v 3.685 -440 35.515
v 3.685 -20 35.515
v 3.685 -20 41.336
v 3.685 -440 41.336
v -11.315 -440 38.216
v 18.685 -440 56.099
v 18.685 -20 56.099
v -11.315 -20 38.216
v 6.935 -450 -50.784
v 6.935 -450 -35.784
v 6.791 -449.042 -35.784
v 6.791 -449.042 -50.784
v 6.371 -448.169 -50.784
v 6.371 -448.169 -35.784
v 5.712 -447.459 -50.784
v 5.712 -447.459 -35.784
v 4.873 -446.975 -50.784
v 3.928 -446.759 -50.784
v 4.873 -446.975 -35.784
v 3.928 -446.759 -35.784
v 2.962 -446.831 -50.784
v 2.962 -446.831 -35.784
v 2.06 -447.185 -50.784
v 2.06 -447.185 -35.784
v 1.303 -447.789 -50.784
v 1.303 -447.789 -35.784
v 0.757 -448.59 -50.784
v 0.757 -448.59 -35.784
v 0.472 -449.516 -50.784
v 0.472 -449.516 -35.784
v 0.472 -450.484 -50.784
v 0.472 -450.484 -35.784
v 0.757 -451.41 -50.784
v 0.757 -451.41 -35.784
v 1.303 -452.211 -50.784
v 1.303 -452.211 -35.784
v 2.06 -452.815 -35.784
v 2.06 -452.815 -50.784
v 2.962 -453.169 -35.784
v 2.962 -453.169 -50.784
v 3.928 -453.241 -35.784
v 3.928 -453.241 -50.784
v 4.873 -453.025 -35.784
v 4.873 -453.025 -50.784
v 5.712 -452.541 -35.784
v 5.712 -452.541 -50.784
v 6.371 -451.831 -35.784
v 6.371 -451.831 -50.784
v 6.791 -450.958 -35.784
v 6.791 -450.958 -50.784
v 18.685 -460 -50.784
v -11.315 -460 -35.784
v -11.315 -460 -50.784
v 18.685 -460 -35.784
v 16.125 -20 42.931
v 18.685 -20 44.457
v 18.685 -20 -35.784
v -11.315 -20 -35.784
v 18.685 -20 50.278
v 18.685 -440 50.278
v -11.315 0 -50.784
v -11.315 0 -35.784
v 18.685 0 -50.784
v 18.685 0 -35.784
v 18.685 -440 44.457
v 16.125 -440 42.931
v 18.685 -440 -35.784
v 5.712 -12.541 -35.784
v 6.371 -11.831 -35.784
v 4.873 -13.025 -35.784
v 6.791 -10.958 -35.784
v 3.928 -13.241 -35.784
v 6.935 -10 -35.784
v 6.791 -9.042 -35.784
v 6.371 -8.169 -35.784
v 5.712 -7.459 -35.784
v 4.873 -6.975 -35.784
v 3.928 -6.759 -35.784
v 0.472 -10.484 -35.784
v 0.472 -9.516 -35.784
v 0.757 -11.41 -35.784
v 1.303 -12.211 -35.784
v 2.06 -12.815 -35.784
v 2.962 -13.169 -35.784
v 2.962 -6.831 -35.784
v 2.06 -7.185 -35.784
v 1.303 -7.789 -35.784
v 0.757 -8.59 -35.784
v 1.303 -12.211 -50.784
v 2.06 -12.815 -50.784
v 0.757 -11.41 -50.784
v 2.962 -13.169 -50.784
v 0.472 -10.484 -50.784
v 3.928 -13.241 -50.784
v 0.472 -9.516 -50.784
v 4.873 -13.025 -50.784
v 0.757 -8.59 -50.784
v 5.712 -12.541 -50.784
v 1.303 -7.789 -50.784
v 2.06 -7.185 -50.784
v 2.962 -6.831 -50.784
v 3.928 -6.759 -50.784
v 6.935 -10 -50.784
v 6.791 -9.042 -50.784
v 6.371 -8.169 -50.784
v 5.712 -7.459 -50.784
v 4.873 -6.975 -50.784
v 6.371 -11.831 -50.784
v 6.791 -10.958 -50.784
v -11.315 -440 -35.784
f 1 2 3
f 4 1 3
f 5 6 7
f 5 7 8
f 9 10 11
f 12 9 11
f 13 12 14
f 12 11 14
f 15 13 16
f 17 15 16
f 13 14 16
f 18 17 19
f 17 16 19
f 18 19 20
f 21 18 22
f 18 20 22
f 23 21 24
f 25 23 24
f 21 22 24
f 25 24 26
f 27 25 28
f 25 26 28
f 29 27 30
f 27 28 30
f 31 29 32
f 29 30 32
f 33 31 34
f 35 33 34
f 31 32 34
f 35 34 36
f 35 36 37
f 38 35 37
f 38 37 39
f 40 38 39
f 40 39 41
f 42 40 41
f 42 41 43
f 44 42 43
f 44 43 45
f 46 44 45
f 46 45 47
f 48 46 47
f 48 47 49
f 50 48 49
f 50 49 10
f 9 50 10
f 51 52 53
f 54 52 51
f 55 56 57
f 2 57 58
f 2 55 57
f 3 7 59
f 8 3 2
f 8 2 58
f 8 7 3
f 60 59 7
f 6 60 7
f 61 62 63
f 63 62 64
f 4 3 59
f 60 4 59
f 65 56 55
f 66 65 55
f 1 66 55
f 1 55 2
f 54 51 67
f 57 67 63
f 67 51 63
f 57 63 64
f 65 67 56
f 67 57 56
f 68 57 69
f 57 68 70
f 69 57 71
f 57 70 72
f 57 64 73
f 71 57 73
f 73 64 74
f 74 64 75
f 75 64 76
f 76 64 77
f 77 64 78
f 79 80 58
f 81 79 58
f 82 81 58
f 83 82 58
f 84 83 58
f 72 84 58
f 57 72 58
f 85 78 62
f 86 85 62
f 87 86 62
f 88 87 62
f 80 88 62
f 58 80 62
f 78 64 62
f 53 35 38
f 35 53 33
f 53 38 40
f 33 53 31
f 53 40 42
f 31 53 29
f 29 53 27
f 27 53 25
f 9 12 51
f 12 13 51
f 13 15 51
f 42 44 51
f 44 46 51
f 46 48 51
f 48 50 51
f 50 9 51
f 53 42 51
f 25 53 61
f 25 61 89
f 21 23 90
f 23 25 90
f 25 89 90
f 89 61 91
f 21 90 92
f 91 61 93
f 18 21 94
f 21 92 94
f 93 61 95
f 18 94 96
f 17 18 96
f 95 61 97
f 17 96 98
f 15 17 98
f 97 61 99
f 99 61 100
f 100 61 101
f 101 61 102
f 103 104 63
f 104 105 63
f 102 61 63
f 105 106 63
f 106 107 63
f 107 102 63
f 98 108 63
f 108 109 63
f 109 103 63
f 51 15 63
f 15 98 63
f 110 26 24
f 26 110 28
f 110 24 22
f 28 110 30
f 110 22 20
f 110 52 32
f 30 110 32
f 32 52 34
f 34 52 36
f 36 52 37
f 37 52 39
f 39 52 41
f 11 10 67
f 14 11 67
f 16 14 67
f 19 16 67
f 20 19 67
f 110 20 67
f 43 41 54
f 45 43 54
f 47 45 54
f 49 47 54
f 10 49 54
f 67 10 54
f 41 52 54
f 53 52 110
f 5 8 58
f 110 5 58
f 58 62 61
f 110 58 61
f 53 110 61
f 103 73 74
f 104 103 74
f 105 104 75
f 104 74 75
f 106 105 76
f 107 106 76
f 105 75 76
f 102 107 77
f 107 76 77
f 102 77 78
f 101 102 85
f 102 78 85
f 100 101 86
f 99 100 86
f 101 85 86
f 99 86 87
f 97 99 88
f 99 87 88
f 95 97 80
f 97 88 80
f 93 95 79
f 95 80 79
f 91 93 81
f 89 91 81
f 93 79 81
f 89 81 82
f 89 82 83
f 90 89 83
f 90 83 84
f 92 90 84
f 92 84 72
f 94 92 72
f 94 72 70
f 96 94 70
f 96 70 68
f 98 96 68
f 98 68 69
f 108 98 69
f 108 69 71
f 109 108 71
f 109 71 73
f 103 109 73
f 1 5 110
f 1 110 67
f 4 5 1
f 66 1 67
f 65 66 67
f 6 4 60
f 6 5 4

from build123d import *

# Parameters (mm, degrees)
F1_DEPTH = 460
F2_W     = 30
F2_H     = 93
F3_DEPTH = 20
F5_DEPTH = 20
F6_R     = 3.25
F7_DEPTH = 15.001


with BuildPart() as f1:
    # F0 (on Front) → F1 (new body)
    with BuildSketch(Plane.XZ):
        Polygon((18.685265, 56.099155), (-11.314735, 38.215565), (-11.314735, -50.784435), (18.685265, -50.784435), (18.685265, -35.784435), (18.685265, 38.636174), (18.685265, 44.457167), (16.12505, 42.930973), (3.685265, 35.515373), (3.685265, 38.636174), (3.685265, 41.336367), (18.685265, 50.278161), align=None)
    extrude(amount=F1_DEPTH)

    # F2 (on face) → F3 (cut)
    with BuildSketch(Plane.XZ.offset(460)):
        with Locations((3.685265, 10.715565)):
            Rectangle(F2_W, F2_H)
    extrude(amount=-F3_DEPTH, mode=Mode.SUBTRACT)

    # F4 (on face) → F5 (cut)
    with BuildSketch(Plane(origin=(0, 0, 0), x_dir=(-1, 0, 0), z_dir=(0, 1, 0))):
        Polygon((-18.685265, 57.215565), (-18.685265, -35.784435), (11.314735, -35.784435), (11.314735, -26.784435), (11.314735, 57.215565), align=None)
    extrude(amount=-F5_DEPTH, mode=Mode.SUBTRACT)

    # F6 (on face) → F7 (cut, through all)
    with BuildSketch(Plane.XY.offset(-35.784435)):
        with Locations((3.685265, -10)):
            Circle(F6_R)
        with Locations((3.685265, -450)):
            Circle(F6_R)
    extrude(amount=-F7_DEPTH, mode=Mode.SUBTRACT)


solid = f1.part
